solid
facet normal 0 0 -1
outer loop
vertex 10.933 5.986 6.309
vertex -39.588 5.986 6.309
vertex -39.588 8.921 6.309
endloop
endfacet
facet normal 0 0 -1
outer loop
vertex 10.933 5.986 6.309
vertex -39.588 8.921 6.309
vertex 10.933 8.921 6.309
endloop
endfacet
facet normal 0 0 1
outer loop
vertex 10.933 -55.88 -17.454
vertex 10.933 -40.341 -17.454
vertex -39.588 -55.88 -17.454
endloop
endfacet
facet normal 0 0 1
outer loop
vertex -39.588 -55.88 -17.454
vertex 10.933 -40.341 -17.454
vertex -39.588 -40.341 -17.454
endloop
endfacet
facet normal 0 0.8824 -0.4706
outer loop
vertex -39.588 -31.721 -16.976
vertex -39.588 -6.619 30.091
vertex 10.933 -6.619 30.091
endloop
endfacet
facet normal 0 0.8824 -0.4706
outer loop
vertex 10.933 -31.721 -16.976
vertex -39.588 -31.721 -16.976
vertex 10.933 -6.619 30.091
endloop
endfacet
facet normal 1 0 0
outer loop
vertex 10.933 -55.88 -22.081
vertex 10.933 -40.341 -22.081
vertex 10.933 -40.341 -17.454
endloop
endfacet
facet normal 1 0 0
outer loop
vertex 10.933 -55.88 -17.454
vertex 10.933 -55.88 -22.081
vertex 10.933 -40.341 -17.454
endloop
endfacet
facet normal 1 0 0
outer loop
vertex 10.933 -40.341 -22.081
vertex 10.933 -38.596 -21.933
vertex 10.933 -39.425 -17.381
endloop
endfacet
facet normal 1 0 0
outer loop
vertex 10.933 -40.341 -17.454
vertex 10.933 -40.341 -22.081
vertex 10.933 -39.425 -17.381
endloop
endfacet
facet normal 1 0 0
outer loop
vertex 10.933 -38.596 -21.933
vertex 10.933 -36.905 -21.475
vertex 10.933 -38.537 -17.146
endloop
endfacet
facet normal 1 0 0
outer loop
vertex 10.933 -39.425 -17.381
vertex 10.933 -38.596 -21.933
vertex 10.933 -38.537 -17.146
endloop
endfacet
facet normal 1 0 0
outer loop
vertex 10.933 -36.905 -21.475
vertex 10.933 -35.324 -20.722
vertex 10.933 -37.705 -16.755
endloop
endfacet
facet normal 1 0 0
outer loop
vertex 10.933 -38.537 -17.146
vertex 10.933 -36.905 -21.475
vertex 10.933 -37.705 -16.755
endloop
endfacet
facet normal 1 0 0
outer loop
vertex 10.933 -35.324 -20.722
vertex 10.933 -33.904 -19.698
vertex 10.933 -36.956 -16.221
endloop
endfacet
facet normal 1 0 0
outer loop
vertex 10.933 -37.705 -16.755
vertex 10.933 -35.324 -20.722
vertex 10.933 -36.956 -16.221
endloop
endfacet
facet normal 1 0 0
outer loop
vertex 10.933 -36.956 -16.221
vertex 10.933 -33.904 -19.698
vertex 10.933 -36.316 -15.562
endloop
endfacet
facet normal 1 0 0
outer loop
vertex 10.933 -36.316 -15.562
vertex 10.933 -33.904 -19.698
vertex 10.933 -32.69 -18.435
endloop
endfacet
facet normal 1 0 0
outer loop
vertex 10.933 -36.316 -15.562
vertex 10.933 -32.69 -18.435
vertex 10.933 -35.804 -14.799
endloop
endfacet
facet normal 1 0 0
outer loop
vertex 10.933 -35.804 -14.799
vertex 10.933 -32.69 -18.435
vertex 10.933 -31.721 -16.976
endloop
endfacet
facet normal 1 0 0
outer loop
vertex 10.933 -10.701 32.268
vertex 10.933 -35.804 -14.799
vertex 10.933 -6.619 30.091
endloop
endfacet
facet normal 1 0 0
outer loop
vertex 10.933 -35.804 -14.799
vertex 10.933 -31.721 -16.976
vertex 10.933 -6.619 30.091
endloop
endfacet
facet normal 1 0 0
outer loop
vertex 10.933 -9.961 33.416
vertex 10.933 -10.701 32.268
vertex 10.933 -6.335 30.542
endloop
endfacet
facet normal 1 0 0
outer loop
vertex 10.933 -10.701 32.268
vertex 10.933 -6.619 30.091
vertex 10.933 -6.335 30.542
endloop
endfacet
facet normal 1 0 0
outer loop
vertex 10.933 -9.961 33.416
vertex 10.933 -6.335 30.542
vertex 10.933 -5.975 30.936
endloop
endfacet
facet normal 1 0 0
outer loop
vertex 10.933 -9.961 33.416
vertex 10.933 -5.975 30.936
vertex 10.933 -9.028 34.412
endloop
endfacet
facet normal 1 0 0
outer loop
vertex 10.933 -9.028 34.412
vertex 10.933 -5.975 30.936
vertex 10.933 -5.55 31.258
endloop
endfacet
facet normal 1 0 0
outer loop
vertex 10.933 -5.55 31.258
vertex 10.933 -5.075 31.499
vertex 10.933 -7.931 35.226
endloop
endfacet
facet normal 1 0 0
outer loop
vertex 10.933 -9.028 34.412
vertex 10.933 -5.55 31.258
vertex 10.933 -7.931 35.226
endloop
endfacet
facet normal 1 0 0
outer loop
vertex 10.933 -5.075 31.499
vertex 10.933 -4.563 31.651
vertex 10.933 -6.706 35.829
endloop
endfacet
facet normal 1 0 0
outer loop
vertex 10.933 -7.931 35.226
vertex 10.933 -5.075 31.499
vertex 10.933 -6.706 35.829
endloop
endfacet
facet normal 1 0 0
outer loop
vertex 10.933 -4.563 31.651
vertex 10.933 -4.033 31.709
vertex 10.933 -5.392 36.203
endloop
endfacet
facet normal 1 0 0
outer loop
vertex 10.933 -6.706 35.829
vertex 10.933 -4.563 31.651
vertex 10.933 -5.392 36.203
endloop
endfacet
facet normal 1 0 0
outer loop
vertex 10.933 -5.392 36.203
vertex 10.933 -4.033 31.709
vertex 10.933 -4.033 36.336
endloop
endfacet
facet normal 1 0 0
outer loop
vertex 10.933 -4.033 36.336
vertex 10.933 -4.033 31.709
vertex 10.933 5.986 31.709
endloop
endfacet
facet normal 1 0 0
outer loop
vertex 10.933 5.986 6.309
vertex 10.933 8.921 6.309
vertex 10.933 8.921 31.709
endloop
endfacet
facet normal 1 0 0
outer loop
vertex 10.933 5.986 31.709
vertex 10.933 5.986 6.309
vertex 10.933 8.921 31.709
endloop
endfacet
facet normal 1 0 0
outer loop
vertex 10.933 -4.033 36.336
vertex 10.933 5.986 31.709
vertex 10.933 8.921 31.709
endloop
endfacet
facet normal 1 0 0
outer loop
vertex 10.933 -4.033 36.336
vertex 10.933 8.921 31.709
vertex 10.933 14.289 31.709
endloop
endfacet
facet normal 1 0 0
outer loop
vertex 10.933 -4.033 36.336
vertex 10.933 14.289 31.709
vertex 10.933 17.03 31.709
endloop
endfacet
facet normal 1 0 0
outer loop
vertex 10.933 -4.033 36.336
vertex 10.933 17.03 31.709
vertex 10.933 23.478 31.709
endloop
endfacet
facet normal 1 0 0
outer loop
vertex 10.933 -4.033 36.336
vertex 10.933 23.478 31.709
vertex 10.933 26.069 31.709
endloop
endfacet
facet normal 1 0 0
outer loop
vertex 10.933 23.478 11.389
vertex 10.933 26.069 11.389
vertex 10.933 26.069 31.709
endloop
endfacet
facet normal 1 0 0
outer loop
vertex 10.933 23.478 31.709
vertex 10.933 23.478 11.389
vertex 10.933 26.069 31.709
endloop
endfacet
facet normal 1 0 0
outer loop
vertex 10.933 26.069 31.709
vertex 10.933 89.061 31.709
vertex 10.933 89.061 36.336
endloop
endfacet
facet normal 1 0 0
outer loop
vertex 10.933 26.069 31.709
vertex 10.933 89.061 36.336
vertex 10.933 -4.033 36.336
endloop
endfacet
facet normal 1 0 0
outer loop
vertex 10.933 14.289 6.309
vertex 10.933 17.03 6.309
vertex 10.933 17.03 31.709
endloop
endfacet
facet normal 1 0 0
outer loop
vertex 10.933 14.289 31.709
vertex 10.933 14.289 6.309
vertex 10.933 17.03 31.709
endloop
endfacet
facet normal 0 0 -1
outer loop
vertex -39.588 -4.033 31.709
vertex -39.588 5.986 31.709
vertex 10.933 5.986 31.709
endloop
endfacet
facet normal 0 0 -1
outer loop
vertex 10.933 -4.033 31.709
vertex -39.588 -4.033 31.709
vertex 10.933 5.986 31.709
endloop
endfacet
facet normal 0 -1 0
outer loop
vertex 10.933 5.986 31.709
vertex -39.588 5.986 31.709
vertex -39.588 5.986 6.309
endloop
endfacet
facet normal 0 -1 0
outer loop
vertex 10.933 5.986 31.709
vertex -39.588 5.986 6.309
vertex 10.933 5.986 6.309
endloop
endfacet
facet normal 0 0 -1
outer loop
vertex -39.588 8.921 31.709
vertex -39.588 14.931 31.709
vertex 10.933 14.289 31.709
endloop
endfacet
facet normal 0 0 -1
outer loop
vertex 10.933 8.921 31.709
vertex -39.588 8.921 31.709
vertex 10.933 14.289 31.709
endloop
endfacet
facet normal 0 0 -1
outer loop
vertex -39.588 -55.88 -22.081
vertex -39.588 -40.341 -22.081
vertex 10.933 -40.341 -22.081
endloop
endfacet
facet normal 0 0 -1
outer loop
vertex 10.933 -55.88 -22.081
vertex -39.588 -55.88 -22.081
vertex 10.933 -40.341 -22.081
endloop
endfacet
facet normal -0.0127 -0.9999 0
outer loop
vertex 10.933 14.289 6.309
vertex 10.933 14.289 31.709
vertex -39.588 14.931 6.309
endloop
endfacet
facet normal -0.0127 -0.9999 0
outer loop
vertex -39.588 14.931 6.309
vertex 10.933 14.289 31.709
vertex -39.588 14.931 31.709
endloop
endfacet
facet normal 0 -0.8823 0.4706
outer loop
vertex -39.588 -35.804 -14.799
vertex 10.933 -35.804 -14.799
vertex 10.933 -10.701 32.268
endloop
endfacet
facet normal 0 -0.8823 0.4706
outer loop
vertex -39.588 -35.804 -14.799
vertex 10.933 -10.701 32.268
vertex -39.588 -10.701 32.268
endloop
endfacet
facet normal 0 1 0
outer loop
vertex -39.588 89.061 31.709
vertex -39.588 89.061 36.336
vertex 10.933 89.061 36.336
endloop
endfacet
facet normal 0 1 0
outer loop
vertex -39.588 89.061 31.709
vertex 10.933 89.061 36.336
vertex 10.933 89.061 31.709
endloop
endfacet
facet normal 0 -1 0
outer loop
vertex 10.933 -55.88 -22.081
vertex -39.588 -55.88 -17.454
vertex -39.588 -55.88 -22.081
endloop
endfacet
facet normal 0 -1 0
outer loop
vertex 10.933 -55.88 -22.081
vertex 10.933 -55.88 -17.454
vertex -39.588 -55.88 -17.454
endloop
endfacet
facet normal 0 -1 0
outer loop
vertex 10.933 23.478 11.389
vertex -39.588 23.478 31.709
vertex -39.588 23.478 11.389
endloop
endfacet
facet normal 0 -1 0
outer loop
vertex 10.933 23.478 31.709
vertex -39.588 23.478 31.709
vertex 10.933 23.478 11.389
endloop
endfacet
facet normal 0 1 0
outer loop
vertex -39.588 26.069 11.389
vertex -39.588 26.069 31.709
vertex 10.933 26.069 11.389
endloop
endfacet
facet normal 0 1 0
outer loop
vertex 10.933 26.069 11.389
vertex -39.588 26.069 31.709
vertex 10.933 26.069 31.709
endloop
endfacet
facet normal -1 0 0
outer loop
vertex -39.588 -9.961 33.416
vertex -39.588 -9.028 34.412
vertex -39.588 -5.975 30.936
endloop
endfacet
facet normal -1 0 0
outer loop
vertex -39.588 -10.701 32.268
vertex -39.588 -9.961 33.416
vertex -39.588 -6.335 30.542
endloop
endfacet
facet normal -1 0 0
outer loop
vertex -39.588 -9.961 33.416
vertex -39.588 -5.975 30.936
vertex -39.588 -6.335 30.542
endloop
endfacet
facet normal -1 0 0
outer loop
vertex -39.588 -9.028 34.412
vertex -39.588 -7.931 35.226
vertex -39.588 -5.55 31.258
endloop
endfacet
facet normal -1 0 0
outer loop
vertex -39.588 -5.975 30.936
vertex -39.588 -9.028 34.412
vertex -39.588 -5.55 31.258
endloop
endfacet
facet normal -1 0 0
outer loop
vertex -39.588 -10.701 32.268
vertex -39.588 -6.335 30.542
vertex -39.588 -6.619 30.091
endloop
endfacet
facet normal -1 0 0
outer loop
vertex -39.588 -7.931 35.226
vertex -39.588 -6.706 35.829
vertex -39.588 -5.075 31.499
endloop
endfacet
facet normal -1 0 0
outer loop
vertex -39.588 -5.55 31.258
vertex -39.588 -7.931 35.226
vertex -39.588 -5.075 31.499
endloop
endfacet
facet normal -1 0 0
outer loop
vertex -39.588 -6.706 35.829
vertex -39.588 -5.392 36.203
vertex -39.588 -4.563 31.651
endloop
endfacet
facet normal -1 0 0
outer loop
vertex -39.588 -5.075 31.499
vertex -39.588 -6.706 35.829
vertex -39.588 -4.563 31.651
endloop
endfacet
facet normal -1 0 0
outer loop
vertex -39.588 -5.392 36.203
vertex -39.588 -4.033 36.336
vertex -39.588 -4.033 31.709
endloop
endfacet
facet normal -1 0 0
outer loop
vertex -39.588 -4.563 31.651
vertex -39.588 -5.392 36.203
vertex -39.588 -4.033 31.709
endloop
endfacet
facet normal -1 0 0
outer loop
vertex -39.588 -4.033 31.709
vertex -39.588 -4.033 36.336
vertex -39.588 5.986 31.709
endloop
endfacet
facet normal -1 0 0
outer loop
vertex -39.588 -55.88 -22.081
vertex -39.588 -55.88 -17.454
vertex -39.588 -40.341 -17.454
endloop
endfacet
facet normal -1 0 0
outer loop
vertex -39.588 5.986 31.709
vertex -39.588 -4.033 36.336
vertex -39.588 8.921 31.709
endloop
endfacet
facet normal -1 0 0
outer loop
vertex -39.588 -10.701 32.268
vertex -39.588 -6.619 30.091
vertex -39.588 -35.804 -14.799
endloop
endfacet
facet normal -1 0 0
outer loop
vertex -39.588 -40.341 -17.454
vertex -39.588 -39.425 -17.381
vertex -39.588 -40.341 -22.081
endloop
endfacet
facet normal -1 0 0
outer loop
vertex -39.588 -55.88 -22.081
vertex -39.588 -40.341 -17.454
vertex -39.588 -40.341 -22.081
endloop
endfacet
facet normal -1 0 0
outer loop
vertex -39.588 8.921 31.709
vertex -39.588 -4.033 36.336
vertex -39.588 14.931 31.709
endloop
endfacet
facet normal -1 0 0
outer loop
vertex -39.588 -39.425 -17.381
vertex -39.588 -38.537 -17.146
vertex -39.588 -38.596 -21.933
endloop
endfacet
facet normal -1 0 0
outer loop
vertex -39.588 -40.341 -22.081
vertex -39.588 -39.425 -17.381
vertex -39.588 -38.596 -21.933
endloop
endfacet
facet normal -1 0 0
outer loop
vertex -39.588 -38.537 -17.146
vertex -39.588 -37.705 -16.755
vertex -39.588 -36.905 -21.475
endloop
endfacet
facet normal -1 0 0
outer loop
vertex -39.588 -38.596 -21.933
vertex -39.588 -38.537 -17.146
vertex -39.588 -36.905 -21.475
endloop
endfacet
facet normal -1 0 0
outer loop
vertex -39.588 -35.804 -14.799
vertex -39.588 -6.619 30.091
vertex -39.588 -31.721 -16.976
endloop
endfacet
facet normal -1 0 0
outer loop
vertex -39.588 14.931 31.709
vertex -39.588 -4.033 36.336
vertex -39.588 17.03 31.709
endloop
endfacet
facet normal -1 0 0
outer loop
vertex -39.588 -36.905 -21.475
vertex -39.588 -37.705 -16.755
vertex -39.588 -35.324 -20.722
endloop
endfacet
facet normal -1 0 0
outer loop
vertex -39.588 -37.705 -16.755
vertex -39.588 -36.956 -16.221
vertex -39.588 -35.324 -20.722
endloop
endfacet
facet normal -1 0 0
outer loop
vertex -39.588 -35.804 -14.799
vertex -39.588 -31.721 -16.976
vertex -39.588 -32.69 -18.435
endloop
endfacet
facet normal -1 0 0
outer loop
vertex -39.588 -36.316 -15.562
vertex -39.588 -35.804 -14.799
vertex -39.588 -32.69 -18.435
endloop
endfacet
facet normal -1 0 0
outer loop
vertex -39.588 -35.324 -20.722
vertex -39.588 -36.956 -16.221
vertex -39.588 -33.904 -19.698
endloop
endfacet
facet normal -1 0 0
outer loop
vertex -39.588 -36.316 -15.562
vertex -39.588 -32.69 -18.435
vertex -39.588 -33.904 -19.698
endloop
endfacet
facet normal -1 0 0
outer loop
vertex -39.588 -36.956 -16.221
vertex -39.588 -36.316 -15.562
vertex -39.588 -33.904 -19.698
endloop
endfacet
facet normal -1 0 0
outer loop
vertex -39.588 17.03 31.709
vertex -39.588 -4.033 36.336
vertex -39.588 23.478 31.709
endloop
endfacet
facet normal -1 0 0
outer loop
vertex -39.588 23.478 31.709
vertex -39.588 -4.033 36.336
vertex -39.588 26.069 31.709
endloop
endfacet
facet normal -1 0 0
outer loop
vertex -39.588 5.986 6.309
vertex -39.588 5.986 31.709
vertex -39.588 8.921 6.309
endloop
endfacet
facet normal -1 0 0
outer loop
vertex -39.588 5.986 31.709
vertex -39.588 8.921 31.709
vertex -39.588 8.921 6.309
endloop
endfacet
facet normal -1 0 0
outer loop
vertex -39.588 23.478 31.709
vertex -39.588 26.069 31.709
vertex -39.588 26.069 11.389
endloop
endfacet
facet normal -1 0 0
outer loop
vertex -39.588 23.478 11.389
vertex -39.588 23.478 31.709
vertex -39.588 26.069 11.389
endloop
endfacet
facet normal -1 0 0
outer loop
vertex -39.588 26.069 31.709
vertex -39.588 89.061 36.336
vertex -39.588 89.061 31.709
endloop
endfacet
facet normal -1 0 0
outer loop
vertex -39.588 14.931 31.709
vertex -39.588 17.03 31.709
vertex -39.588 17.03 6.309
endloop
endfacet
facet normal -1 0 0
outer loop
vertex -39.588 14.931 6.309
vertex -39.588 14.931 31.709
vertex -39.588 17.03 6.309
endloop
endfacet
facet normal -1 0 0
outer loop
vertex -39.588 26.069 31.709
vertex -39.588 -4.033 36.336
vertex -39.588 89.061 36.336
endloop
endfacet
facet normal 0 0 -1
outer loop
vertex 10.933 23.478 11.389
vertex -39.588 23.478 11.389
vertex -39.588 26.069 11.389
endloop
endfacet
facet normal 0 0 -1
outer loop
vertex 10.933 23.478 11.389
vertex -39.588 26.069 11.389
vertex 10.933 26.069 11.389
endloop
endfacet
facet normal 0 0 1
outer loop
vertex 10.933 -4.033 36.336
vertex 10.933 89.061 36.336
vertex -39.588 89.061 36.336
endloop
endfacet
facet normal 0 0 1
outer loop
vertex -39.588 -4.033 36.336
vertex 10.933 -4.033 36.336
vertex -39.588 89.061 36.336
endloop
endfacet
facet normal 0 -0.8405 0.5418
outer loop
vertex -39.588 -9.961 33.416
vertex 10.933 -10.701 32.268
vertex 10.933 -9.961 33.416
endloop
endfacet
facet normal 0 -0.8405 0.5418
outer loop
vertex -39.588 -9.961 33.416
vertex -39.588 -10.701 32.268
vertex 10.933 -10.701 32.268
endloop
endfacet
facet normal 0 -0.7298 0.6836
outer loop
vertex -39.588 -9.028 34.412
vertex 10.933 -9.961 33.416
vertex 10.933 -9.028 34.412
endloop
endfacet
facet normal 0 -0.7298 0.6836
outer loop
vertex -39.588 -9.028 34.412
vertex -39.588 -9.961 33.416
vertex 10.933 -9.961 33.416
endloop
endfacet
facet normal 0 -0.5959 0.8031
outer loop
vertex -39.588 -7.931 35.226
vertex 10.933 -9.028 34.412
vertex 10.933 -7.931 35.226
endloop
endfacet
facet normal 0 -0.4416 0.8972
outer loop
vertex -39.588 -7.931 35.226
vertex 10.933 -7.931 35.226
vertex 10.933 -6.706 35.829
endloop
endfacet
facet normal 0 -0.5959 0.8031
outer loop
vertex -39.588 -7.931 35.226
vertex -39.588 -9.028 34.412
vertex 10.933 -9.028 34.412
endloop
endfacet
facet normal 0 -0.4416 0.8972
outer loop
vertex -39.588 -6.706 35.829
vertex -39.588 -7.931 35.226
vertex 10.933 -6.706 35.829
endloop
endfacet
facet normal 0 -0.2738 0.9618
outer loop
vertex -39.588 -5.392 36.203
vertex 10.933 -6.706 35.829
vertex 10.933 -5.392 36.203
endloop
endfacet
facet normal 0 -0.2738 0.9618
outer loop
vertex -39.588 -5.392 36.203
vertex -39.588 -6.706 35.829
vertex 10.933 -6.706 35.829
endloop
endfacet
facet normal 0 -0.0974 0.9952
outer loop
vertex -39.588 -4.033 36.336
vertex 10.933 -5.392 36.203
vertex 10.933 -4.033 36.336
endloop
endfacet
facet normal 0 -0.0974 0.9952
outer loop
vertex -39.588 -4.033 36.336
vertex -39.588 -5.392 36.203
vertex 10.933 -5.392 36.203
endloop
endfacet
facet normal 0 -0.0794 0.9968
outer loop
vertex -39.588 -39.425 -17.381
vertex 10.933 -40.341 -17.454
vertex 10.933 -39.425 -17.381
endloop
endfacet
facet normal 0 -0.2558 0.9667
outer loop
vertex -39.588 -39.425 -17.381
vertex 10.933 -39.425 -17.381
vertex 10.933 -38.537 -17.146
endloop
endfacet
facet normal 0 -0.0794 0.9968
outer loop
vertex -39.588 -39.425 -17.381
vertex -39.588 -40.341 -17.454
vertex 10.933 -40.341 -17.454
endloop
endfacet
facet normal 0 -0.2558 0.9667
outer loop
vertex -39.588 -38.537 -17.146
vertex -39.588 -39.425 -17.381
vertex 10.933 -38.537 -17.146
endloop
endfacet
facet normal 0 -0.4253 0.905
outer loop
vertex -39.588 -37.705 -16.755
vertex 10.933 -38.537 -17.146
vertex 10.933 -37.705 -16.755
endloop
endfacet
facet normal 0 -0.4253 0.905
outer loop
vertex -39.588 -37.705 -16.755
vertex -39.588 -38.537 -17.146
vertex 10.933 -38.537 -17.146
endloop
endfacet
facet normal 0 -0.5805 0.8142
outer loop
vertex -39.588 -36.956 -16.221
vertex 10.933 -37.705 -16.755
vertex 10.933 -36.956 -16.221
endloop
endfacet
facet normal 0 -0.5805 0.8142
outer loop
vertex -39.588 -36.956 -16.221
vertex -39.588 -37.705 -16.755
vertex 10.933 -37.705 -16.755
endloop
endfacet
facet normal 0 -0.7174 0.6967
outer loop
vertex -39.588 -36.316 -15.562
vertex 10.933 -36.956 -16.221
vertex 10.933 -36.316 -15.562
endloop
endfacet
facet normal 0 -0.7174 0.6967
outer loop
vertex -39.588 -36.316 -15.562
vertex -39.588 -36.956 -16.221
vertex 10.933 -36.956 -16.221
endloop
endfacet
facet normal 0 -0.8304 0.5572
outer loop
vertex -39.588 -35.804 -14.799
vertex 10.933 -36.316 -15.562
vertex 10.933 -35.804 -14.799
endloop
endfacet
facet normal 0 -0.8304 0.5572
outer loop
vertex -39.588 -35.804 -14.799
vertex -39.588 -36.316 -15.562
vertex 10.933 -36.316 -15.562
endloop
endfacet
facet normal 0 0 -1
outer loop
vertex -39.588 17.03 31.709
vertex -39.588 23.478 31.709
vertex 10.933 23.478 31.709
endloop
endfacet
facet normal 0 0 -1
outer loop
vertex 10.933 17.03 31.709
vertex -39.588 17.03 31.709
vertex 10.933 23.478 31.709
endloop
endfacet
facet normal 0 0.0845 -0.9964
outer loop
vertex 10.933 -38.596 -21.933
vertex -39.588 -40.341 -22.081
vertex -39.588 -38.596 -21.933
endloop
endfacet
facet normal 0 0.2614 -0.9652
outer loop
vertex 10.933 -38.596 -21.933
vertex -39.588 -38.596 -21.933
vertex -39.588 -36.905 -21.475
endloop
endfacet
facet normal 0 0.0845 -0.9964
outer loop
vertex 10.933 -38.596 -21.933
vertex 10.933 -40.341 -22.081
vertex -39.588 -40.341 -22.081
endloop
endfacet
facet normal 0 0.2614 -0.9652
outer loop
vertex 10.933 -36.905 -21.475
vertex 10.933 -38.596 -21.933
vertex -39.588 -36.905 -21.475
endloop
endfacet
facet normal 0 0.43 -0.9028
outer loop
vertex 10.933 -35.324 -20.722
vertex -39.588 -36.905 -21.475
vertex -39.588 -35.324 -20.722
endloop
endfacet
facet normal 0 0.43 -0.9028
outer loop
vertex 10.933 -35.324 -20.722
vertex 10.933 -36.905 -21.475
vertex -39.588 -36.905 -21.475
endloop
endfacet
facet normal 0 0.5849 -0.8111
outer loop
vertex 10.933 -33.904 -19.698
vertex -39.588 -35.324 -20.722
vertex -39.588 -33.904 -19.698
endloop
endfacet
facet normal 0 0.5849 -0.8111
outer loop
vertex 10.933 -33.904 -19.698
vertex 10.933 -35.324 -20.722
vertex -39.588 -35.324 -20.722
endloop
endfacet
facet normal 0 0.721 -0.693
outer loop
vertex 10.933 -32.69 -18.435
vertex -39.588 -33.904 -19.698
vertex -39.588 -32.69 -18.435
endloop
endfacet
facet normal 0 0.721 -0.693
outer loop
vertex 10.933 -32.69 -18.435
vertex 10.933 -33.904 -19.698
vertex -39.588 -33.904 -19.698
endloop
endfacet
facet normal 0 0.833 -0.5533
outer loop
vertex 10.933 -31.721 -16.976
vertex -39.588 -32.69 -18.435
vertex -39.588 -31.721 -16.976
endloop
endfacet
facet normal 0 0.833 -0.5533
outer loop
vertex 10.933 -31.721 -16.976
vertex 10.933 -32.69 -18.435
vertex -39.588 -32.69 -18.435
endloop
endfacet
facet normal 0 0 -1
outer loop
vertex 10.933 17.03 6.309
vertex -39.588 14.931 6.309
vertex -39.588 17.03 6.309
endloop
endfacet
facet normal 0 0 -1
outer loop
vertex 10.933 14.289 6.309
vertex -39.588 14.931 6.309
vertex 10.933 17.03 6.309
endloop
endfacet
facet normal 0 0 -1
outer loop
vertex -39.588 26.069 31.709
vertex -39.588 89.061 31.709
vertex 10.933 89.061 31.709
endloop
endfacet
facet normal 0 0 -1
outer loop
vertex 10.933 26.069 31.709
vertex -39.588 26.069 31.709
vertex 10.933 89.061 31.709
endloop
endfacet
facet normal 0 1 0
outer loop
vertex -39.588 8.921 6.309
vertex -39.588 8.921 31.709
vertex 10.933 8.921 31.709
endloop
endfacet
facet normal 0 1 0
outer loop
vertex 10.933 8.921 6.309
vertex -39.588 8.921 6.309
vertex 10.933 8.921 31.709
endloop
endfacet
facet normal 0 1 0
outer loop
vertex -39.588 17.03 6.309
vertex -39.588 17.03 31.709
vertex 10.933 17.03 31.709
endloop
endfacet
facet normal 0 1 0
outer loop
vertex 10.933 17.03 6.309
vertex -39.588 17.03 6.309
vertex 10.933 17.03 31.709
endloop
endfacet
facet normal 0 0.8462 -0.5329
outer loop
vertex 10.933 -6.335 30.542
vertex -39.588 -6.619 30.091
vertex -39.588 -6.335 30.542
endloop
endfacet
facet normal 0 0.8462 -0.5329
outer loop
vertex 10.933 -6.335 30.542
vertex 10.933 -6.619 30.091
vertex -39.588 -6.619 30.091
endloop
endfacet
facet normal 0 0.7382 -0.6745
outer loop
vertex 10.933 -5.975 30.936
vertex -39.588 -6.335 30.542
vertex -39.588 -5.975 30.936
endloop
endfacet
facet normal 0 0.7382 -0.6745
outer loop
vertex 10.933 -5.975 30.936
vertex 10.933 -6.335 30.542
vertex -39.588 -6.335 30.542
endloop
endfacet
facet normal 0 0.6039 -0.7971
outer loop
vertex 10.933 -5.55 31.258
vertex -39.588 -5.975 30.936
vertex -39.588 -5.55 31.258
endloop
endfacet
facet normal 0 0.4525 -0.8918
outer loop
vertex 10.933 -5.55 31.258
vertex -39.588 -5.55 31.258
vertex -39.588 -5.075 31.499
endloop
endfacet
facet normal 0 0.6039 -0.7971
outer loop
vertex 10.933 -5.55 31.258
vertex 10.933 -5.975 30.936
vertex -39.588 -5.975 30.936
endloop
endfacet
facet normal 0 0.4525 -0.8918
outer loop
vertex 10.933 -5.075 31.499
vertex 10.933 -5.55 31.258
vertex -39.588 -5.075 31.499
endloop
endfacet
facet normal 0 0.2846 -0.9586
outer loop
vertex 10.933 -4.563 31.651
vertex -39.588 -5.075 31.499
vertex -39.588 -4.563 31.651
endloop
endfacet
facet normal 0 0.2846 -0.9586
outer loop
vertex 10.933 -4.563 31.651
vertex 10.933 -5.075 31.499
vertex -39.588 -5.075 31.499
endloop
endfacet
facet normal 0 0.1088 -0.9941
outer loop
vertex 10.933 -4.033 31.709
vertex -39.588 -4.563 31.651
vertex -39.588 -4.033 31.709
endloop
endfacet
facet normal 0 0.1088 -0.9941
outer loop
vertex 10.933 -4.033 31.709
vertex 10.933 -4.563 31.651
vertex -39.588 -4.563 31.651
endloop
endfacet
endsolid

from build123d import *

# Parameters (mm, degrees)
F2_W     = 50.5212787539
F2_H     = 4.6267285943
F4_W     = 50.5212787539
F4_H     = 2.9346304946
F5_DEPTH = 20.066
F6_DEPTH = 25.4
F4_H_2   = 2.5909789344
F7_DEPTH = 20.32


with BuildPart() as f3:
    # F3: sweep along a path in F0
    with BuildLine(Plane.YZ) as f3_path:
        Line((-55.8239743114, -18.6951477081), (-40.2851480178, -18.6951477081))
        ThreePointArc((-40.2851480178, -18.6951477081), (-37.0180999924, -17.7902277993), (-34.682206865, -15.3333830466))
        Line((-34.682206865, -15.3333830466), (-9.579990698, 31.7332713683))
        ThreePointArc((-9.579990698, 31.7332713683), (-7.2440975706, 34.190116121), (-3.9770495452, 35.0950360298))
        Line((-3.9770495452, 35.0950360298), (89.1171097755, 35.0950360298))
    # F2 (on offset) → F3 (sweep)
    with BuildSketch(Plane.XZ.offset(55.88)):
        with Locations((-14.3274748698, -19.7674240917)):
            Rectangle(F2_W, F2_H)
    sweep(path=f3_path.line)

    # F4 (on face) → F5 (join)
    with BuildSketch(Plane(origin=(0, 0, 31.709395349), x_dir=(1, 0, 0), z_dir=(0, 0, -1))):
        with Locations((-14.3274748698, -7.4532397557)):
            Rectangle(F4_W, F4_H)
    extrude(amount=F5_DEPTH)

    # F4 (on face) → F6 (join)
    with BuildSketch(Plane(origin=(0, 0, 31.709395349), x_dir=(1, 0, 0), z_dir=(0, 0, -1))):
        with Locations((-14.3274748698, -7.4532397557)):
            Rectangle(F4_W, F4_H)
        Polygon((10.9331645072, -17.0301664621), (10.9331645072, -14.2893027514), (-39.5881142467, -14.9312503636), (-39.5881142467, -17.0301664621), align=None)
    extrude(amount=F6_DEPTH)

    # F4 (on face) → F7 (join)
    with BuildSketch(Plane(origin=(0, 0, 31.709395349), x_dir=(1, 0, 0), z_dir=(0, 0, -1))):
        with Locations((-14.3274748698, -24.7733006254)):
            Rectangle(F4_W, F4_H_2)
    extrude(amount=F7_DEPTH)


solid = f3.part
